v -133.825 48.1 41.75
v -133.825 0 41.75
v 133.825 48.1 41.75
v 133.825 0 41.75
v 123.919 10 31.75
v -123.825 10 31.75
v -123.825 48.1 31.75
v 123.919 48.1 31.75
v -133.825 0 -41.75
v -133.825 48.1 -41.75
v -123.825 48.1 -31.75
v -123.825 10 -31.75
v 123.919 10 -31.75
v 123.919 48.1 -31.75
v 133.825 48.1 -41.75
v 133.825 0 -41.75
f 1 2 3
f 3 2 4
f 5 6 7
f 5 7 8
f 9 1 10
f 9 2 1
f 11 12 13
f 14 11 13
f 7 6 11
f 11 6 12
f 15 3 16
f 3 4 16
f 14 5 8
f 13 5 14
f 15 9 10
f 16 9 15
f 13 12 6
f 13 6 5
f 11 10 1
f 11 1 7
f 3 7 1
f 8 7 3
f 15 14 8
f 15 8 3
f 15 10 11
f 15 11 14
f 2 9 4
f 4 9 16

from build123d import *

# Parameters (mm, degrees)
SKETCH2_W           = 267.6500108
SKETCH2_H           = 83.5000108
BOSS_EXTRUDE2_DEPTH = 10
SKETCH3_W           = 267.6500108
SKETCH3_H           = 83.5000108
SKETCH3_W_2         = 247.7440108
SKETCH3_H_2         = 63.5000108
BOSS_EXTRUDE3_DEPTH = 38.1


with BuildPart() as part:
    # Sketch2 → Boss-Extrude2 (new body)
    with BuildSketch(Plane(origin=(0, 0, 0), x_dir=(1, 0, 0), z_dir=(0, 1, 0))):
        Rectangle(SKETCH2_W, SKETCH2_H)
    extrude(amount=BOSS_EXTRUDE2_DEPTH)

    # Sketch3 → Boss-Extrude3 (add)
    with BuildSketch(Plane(origin=(0, 10, 0), x_dir=(1, 0, 0), z_dir=(0, 1, 0))):
        Rectangle(SKETCH3_W, SKETCH3_H)
        with Locations((0.047, 0)):
            Rectangle(SKETCH3_W_2, SKETCH3_H_2, mode=Mode.SUBTRACT)
    extrude(amount=BOSS_EXTRUDE3_DEPTH)


solid = part.part
